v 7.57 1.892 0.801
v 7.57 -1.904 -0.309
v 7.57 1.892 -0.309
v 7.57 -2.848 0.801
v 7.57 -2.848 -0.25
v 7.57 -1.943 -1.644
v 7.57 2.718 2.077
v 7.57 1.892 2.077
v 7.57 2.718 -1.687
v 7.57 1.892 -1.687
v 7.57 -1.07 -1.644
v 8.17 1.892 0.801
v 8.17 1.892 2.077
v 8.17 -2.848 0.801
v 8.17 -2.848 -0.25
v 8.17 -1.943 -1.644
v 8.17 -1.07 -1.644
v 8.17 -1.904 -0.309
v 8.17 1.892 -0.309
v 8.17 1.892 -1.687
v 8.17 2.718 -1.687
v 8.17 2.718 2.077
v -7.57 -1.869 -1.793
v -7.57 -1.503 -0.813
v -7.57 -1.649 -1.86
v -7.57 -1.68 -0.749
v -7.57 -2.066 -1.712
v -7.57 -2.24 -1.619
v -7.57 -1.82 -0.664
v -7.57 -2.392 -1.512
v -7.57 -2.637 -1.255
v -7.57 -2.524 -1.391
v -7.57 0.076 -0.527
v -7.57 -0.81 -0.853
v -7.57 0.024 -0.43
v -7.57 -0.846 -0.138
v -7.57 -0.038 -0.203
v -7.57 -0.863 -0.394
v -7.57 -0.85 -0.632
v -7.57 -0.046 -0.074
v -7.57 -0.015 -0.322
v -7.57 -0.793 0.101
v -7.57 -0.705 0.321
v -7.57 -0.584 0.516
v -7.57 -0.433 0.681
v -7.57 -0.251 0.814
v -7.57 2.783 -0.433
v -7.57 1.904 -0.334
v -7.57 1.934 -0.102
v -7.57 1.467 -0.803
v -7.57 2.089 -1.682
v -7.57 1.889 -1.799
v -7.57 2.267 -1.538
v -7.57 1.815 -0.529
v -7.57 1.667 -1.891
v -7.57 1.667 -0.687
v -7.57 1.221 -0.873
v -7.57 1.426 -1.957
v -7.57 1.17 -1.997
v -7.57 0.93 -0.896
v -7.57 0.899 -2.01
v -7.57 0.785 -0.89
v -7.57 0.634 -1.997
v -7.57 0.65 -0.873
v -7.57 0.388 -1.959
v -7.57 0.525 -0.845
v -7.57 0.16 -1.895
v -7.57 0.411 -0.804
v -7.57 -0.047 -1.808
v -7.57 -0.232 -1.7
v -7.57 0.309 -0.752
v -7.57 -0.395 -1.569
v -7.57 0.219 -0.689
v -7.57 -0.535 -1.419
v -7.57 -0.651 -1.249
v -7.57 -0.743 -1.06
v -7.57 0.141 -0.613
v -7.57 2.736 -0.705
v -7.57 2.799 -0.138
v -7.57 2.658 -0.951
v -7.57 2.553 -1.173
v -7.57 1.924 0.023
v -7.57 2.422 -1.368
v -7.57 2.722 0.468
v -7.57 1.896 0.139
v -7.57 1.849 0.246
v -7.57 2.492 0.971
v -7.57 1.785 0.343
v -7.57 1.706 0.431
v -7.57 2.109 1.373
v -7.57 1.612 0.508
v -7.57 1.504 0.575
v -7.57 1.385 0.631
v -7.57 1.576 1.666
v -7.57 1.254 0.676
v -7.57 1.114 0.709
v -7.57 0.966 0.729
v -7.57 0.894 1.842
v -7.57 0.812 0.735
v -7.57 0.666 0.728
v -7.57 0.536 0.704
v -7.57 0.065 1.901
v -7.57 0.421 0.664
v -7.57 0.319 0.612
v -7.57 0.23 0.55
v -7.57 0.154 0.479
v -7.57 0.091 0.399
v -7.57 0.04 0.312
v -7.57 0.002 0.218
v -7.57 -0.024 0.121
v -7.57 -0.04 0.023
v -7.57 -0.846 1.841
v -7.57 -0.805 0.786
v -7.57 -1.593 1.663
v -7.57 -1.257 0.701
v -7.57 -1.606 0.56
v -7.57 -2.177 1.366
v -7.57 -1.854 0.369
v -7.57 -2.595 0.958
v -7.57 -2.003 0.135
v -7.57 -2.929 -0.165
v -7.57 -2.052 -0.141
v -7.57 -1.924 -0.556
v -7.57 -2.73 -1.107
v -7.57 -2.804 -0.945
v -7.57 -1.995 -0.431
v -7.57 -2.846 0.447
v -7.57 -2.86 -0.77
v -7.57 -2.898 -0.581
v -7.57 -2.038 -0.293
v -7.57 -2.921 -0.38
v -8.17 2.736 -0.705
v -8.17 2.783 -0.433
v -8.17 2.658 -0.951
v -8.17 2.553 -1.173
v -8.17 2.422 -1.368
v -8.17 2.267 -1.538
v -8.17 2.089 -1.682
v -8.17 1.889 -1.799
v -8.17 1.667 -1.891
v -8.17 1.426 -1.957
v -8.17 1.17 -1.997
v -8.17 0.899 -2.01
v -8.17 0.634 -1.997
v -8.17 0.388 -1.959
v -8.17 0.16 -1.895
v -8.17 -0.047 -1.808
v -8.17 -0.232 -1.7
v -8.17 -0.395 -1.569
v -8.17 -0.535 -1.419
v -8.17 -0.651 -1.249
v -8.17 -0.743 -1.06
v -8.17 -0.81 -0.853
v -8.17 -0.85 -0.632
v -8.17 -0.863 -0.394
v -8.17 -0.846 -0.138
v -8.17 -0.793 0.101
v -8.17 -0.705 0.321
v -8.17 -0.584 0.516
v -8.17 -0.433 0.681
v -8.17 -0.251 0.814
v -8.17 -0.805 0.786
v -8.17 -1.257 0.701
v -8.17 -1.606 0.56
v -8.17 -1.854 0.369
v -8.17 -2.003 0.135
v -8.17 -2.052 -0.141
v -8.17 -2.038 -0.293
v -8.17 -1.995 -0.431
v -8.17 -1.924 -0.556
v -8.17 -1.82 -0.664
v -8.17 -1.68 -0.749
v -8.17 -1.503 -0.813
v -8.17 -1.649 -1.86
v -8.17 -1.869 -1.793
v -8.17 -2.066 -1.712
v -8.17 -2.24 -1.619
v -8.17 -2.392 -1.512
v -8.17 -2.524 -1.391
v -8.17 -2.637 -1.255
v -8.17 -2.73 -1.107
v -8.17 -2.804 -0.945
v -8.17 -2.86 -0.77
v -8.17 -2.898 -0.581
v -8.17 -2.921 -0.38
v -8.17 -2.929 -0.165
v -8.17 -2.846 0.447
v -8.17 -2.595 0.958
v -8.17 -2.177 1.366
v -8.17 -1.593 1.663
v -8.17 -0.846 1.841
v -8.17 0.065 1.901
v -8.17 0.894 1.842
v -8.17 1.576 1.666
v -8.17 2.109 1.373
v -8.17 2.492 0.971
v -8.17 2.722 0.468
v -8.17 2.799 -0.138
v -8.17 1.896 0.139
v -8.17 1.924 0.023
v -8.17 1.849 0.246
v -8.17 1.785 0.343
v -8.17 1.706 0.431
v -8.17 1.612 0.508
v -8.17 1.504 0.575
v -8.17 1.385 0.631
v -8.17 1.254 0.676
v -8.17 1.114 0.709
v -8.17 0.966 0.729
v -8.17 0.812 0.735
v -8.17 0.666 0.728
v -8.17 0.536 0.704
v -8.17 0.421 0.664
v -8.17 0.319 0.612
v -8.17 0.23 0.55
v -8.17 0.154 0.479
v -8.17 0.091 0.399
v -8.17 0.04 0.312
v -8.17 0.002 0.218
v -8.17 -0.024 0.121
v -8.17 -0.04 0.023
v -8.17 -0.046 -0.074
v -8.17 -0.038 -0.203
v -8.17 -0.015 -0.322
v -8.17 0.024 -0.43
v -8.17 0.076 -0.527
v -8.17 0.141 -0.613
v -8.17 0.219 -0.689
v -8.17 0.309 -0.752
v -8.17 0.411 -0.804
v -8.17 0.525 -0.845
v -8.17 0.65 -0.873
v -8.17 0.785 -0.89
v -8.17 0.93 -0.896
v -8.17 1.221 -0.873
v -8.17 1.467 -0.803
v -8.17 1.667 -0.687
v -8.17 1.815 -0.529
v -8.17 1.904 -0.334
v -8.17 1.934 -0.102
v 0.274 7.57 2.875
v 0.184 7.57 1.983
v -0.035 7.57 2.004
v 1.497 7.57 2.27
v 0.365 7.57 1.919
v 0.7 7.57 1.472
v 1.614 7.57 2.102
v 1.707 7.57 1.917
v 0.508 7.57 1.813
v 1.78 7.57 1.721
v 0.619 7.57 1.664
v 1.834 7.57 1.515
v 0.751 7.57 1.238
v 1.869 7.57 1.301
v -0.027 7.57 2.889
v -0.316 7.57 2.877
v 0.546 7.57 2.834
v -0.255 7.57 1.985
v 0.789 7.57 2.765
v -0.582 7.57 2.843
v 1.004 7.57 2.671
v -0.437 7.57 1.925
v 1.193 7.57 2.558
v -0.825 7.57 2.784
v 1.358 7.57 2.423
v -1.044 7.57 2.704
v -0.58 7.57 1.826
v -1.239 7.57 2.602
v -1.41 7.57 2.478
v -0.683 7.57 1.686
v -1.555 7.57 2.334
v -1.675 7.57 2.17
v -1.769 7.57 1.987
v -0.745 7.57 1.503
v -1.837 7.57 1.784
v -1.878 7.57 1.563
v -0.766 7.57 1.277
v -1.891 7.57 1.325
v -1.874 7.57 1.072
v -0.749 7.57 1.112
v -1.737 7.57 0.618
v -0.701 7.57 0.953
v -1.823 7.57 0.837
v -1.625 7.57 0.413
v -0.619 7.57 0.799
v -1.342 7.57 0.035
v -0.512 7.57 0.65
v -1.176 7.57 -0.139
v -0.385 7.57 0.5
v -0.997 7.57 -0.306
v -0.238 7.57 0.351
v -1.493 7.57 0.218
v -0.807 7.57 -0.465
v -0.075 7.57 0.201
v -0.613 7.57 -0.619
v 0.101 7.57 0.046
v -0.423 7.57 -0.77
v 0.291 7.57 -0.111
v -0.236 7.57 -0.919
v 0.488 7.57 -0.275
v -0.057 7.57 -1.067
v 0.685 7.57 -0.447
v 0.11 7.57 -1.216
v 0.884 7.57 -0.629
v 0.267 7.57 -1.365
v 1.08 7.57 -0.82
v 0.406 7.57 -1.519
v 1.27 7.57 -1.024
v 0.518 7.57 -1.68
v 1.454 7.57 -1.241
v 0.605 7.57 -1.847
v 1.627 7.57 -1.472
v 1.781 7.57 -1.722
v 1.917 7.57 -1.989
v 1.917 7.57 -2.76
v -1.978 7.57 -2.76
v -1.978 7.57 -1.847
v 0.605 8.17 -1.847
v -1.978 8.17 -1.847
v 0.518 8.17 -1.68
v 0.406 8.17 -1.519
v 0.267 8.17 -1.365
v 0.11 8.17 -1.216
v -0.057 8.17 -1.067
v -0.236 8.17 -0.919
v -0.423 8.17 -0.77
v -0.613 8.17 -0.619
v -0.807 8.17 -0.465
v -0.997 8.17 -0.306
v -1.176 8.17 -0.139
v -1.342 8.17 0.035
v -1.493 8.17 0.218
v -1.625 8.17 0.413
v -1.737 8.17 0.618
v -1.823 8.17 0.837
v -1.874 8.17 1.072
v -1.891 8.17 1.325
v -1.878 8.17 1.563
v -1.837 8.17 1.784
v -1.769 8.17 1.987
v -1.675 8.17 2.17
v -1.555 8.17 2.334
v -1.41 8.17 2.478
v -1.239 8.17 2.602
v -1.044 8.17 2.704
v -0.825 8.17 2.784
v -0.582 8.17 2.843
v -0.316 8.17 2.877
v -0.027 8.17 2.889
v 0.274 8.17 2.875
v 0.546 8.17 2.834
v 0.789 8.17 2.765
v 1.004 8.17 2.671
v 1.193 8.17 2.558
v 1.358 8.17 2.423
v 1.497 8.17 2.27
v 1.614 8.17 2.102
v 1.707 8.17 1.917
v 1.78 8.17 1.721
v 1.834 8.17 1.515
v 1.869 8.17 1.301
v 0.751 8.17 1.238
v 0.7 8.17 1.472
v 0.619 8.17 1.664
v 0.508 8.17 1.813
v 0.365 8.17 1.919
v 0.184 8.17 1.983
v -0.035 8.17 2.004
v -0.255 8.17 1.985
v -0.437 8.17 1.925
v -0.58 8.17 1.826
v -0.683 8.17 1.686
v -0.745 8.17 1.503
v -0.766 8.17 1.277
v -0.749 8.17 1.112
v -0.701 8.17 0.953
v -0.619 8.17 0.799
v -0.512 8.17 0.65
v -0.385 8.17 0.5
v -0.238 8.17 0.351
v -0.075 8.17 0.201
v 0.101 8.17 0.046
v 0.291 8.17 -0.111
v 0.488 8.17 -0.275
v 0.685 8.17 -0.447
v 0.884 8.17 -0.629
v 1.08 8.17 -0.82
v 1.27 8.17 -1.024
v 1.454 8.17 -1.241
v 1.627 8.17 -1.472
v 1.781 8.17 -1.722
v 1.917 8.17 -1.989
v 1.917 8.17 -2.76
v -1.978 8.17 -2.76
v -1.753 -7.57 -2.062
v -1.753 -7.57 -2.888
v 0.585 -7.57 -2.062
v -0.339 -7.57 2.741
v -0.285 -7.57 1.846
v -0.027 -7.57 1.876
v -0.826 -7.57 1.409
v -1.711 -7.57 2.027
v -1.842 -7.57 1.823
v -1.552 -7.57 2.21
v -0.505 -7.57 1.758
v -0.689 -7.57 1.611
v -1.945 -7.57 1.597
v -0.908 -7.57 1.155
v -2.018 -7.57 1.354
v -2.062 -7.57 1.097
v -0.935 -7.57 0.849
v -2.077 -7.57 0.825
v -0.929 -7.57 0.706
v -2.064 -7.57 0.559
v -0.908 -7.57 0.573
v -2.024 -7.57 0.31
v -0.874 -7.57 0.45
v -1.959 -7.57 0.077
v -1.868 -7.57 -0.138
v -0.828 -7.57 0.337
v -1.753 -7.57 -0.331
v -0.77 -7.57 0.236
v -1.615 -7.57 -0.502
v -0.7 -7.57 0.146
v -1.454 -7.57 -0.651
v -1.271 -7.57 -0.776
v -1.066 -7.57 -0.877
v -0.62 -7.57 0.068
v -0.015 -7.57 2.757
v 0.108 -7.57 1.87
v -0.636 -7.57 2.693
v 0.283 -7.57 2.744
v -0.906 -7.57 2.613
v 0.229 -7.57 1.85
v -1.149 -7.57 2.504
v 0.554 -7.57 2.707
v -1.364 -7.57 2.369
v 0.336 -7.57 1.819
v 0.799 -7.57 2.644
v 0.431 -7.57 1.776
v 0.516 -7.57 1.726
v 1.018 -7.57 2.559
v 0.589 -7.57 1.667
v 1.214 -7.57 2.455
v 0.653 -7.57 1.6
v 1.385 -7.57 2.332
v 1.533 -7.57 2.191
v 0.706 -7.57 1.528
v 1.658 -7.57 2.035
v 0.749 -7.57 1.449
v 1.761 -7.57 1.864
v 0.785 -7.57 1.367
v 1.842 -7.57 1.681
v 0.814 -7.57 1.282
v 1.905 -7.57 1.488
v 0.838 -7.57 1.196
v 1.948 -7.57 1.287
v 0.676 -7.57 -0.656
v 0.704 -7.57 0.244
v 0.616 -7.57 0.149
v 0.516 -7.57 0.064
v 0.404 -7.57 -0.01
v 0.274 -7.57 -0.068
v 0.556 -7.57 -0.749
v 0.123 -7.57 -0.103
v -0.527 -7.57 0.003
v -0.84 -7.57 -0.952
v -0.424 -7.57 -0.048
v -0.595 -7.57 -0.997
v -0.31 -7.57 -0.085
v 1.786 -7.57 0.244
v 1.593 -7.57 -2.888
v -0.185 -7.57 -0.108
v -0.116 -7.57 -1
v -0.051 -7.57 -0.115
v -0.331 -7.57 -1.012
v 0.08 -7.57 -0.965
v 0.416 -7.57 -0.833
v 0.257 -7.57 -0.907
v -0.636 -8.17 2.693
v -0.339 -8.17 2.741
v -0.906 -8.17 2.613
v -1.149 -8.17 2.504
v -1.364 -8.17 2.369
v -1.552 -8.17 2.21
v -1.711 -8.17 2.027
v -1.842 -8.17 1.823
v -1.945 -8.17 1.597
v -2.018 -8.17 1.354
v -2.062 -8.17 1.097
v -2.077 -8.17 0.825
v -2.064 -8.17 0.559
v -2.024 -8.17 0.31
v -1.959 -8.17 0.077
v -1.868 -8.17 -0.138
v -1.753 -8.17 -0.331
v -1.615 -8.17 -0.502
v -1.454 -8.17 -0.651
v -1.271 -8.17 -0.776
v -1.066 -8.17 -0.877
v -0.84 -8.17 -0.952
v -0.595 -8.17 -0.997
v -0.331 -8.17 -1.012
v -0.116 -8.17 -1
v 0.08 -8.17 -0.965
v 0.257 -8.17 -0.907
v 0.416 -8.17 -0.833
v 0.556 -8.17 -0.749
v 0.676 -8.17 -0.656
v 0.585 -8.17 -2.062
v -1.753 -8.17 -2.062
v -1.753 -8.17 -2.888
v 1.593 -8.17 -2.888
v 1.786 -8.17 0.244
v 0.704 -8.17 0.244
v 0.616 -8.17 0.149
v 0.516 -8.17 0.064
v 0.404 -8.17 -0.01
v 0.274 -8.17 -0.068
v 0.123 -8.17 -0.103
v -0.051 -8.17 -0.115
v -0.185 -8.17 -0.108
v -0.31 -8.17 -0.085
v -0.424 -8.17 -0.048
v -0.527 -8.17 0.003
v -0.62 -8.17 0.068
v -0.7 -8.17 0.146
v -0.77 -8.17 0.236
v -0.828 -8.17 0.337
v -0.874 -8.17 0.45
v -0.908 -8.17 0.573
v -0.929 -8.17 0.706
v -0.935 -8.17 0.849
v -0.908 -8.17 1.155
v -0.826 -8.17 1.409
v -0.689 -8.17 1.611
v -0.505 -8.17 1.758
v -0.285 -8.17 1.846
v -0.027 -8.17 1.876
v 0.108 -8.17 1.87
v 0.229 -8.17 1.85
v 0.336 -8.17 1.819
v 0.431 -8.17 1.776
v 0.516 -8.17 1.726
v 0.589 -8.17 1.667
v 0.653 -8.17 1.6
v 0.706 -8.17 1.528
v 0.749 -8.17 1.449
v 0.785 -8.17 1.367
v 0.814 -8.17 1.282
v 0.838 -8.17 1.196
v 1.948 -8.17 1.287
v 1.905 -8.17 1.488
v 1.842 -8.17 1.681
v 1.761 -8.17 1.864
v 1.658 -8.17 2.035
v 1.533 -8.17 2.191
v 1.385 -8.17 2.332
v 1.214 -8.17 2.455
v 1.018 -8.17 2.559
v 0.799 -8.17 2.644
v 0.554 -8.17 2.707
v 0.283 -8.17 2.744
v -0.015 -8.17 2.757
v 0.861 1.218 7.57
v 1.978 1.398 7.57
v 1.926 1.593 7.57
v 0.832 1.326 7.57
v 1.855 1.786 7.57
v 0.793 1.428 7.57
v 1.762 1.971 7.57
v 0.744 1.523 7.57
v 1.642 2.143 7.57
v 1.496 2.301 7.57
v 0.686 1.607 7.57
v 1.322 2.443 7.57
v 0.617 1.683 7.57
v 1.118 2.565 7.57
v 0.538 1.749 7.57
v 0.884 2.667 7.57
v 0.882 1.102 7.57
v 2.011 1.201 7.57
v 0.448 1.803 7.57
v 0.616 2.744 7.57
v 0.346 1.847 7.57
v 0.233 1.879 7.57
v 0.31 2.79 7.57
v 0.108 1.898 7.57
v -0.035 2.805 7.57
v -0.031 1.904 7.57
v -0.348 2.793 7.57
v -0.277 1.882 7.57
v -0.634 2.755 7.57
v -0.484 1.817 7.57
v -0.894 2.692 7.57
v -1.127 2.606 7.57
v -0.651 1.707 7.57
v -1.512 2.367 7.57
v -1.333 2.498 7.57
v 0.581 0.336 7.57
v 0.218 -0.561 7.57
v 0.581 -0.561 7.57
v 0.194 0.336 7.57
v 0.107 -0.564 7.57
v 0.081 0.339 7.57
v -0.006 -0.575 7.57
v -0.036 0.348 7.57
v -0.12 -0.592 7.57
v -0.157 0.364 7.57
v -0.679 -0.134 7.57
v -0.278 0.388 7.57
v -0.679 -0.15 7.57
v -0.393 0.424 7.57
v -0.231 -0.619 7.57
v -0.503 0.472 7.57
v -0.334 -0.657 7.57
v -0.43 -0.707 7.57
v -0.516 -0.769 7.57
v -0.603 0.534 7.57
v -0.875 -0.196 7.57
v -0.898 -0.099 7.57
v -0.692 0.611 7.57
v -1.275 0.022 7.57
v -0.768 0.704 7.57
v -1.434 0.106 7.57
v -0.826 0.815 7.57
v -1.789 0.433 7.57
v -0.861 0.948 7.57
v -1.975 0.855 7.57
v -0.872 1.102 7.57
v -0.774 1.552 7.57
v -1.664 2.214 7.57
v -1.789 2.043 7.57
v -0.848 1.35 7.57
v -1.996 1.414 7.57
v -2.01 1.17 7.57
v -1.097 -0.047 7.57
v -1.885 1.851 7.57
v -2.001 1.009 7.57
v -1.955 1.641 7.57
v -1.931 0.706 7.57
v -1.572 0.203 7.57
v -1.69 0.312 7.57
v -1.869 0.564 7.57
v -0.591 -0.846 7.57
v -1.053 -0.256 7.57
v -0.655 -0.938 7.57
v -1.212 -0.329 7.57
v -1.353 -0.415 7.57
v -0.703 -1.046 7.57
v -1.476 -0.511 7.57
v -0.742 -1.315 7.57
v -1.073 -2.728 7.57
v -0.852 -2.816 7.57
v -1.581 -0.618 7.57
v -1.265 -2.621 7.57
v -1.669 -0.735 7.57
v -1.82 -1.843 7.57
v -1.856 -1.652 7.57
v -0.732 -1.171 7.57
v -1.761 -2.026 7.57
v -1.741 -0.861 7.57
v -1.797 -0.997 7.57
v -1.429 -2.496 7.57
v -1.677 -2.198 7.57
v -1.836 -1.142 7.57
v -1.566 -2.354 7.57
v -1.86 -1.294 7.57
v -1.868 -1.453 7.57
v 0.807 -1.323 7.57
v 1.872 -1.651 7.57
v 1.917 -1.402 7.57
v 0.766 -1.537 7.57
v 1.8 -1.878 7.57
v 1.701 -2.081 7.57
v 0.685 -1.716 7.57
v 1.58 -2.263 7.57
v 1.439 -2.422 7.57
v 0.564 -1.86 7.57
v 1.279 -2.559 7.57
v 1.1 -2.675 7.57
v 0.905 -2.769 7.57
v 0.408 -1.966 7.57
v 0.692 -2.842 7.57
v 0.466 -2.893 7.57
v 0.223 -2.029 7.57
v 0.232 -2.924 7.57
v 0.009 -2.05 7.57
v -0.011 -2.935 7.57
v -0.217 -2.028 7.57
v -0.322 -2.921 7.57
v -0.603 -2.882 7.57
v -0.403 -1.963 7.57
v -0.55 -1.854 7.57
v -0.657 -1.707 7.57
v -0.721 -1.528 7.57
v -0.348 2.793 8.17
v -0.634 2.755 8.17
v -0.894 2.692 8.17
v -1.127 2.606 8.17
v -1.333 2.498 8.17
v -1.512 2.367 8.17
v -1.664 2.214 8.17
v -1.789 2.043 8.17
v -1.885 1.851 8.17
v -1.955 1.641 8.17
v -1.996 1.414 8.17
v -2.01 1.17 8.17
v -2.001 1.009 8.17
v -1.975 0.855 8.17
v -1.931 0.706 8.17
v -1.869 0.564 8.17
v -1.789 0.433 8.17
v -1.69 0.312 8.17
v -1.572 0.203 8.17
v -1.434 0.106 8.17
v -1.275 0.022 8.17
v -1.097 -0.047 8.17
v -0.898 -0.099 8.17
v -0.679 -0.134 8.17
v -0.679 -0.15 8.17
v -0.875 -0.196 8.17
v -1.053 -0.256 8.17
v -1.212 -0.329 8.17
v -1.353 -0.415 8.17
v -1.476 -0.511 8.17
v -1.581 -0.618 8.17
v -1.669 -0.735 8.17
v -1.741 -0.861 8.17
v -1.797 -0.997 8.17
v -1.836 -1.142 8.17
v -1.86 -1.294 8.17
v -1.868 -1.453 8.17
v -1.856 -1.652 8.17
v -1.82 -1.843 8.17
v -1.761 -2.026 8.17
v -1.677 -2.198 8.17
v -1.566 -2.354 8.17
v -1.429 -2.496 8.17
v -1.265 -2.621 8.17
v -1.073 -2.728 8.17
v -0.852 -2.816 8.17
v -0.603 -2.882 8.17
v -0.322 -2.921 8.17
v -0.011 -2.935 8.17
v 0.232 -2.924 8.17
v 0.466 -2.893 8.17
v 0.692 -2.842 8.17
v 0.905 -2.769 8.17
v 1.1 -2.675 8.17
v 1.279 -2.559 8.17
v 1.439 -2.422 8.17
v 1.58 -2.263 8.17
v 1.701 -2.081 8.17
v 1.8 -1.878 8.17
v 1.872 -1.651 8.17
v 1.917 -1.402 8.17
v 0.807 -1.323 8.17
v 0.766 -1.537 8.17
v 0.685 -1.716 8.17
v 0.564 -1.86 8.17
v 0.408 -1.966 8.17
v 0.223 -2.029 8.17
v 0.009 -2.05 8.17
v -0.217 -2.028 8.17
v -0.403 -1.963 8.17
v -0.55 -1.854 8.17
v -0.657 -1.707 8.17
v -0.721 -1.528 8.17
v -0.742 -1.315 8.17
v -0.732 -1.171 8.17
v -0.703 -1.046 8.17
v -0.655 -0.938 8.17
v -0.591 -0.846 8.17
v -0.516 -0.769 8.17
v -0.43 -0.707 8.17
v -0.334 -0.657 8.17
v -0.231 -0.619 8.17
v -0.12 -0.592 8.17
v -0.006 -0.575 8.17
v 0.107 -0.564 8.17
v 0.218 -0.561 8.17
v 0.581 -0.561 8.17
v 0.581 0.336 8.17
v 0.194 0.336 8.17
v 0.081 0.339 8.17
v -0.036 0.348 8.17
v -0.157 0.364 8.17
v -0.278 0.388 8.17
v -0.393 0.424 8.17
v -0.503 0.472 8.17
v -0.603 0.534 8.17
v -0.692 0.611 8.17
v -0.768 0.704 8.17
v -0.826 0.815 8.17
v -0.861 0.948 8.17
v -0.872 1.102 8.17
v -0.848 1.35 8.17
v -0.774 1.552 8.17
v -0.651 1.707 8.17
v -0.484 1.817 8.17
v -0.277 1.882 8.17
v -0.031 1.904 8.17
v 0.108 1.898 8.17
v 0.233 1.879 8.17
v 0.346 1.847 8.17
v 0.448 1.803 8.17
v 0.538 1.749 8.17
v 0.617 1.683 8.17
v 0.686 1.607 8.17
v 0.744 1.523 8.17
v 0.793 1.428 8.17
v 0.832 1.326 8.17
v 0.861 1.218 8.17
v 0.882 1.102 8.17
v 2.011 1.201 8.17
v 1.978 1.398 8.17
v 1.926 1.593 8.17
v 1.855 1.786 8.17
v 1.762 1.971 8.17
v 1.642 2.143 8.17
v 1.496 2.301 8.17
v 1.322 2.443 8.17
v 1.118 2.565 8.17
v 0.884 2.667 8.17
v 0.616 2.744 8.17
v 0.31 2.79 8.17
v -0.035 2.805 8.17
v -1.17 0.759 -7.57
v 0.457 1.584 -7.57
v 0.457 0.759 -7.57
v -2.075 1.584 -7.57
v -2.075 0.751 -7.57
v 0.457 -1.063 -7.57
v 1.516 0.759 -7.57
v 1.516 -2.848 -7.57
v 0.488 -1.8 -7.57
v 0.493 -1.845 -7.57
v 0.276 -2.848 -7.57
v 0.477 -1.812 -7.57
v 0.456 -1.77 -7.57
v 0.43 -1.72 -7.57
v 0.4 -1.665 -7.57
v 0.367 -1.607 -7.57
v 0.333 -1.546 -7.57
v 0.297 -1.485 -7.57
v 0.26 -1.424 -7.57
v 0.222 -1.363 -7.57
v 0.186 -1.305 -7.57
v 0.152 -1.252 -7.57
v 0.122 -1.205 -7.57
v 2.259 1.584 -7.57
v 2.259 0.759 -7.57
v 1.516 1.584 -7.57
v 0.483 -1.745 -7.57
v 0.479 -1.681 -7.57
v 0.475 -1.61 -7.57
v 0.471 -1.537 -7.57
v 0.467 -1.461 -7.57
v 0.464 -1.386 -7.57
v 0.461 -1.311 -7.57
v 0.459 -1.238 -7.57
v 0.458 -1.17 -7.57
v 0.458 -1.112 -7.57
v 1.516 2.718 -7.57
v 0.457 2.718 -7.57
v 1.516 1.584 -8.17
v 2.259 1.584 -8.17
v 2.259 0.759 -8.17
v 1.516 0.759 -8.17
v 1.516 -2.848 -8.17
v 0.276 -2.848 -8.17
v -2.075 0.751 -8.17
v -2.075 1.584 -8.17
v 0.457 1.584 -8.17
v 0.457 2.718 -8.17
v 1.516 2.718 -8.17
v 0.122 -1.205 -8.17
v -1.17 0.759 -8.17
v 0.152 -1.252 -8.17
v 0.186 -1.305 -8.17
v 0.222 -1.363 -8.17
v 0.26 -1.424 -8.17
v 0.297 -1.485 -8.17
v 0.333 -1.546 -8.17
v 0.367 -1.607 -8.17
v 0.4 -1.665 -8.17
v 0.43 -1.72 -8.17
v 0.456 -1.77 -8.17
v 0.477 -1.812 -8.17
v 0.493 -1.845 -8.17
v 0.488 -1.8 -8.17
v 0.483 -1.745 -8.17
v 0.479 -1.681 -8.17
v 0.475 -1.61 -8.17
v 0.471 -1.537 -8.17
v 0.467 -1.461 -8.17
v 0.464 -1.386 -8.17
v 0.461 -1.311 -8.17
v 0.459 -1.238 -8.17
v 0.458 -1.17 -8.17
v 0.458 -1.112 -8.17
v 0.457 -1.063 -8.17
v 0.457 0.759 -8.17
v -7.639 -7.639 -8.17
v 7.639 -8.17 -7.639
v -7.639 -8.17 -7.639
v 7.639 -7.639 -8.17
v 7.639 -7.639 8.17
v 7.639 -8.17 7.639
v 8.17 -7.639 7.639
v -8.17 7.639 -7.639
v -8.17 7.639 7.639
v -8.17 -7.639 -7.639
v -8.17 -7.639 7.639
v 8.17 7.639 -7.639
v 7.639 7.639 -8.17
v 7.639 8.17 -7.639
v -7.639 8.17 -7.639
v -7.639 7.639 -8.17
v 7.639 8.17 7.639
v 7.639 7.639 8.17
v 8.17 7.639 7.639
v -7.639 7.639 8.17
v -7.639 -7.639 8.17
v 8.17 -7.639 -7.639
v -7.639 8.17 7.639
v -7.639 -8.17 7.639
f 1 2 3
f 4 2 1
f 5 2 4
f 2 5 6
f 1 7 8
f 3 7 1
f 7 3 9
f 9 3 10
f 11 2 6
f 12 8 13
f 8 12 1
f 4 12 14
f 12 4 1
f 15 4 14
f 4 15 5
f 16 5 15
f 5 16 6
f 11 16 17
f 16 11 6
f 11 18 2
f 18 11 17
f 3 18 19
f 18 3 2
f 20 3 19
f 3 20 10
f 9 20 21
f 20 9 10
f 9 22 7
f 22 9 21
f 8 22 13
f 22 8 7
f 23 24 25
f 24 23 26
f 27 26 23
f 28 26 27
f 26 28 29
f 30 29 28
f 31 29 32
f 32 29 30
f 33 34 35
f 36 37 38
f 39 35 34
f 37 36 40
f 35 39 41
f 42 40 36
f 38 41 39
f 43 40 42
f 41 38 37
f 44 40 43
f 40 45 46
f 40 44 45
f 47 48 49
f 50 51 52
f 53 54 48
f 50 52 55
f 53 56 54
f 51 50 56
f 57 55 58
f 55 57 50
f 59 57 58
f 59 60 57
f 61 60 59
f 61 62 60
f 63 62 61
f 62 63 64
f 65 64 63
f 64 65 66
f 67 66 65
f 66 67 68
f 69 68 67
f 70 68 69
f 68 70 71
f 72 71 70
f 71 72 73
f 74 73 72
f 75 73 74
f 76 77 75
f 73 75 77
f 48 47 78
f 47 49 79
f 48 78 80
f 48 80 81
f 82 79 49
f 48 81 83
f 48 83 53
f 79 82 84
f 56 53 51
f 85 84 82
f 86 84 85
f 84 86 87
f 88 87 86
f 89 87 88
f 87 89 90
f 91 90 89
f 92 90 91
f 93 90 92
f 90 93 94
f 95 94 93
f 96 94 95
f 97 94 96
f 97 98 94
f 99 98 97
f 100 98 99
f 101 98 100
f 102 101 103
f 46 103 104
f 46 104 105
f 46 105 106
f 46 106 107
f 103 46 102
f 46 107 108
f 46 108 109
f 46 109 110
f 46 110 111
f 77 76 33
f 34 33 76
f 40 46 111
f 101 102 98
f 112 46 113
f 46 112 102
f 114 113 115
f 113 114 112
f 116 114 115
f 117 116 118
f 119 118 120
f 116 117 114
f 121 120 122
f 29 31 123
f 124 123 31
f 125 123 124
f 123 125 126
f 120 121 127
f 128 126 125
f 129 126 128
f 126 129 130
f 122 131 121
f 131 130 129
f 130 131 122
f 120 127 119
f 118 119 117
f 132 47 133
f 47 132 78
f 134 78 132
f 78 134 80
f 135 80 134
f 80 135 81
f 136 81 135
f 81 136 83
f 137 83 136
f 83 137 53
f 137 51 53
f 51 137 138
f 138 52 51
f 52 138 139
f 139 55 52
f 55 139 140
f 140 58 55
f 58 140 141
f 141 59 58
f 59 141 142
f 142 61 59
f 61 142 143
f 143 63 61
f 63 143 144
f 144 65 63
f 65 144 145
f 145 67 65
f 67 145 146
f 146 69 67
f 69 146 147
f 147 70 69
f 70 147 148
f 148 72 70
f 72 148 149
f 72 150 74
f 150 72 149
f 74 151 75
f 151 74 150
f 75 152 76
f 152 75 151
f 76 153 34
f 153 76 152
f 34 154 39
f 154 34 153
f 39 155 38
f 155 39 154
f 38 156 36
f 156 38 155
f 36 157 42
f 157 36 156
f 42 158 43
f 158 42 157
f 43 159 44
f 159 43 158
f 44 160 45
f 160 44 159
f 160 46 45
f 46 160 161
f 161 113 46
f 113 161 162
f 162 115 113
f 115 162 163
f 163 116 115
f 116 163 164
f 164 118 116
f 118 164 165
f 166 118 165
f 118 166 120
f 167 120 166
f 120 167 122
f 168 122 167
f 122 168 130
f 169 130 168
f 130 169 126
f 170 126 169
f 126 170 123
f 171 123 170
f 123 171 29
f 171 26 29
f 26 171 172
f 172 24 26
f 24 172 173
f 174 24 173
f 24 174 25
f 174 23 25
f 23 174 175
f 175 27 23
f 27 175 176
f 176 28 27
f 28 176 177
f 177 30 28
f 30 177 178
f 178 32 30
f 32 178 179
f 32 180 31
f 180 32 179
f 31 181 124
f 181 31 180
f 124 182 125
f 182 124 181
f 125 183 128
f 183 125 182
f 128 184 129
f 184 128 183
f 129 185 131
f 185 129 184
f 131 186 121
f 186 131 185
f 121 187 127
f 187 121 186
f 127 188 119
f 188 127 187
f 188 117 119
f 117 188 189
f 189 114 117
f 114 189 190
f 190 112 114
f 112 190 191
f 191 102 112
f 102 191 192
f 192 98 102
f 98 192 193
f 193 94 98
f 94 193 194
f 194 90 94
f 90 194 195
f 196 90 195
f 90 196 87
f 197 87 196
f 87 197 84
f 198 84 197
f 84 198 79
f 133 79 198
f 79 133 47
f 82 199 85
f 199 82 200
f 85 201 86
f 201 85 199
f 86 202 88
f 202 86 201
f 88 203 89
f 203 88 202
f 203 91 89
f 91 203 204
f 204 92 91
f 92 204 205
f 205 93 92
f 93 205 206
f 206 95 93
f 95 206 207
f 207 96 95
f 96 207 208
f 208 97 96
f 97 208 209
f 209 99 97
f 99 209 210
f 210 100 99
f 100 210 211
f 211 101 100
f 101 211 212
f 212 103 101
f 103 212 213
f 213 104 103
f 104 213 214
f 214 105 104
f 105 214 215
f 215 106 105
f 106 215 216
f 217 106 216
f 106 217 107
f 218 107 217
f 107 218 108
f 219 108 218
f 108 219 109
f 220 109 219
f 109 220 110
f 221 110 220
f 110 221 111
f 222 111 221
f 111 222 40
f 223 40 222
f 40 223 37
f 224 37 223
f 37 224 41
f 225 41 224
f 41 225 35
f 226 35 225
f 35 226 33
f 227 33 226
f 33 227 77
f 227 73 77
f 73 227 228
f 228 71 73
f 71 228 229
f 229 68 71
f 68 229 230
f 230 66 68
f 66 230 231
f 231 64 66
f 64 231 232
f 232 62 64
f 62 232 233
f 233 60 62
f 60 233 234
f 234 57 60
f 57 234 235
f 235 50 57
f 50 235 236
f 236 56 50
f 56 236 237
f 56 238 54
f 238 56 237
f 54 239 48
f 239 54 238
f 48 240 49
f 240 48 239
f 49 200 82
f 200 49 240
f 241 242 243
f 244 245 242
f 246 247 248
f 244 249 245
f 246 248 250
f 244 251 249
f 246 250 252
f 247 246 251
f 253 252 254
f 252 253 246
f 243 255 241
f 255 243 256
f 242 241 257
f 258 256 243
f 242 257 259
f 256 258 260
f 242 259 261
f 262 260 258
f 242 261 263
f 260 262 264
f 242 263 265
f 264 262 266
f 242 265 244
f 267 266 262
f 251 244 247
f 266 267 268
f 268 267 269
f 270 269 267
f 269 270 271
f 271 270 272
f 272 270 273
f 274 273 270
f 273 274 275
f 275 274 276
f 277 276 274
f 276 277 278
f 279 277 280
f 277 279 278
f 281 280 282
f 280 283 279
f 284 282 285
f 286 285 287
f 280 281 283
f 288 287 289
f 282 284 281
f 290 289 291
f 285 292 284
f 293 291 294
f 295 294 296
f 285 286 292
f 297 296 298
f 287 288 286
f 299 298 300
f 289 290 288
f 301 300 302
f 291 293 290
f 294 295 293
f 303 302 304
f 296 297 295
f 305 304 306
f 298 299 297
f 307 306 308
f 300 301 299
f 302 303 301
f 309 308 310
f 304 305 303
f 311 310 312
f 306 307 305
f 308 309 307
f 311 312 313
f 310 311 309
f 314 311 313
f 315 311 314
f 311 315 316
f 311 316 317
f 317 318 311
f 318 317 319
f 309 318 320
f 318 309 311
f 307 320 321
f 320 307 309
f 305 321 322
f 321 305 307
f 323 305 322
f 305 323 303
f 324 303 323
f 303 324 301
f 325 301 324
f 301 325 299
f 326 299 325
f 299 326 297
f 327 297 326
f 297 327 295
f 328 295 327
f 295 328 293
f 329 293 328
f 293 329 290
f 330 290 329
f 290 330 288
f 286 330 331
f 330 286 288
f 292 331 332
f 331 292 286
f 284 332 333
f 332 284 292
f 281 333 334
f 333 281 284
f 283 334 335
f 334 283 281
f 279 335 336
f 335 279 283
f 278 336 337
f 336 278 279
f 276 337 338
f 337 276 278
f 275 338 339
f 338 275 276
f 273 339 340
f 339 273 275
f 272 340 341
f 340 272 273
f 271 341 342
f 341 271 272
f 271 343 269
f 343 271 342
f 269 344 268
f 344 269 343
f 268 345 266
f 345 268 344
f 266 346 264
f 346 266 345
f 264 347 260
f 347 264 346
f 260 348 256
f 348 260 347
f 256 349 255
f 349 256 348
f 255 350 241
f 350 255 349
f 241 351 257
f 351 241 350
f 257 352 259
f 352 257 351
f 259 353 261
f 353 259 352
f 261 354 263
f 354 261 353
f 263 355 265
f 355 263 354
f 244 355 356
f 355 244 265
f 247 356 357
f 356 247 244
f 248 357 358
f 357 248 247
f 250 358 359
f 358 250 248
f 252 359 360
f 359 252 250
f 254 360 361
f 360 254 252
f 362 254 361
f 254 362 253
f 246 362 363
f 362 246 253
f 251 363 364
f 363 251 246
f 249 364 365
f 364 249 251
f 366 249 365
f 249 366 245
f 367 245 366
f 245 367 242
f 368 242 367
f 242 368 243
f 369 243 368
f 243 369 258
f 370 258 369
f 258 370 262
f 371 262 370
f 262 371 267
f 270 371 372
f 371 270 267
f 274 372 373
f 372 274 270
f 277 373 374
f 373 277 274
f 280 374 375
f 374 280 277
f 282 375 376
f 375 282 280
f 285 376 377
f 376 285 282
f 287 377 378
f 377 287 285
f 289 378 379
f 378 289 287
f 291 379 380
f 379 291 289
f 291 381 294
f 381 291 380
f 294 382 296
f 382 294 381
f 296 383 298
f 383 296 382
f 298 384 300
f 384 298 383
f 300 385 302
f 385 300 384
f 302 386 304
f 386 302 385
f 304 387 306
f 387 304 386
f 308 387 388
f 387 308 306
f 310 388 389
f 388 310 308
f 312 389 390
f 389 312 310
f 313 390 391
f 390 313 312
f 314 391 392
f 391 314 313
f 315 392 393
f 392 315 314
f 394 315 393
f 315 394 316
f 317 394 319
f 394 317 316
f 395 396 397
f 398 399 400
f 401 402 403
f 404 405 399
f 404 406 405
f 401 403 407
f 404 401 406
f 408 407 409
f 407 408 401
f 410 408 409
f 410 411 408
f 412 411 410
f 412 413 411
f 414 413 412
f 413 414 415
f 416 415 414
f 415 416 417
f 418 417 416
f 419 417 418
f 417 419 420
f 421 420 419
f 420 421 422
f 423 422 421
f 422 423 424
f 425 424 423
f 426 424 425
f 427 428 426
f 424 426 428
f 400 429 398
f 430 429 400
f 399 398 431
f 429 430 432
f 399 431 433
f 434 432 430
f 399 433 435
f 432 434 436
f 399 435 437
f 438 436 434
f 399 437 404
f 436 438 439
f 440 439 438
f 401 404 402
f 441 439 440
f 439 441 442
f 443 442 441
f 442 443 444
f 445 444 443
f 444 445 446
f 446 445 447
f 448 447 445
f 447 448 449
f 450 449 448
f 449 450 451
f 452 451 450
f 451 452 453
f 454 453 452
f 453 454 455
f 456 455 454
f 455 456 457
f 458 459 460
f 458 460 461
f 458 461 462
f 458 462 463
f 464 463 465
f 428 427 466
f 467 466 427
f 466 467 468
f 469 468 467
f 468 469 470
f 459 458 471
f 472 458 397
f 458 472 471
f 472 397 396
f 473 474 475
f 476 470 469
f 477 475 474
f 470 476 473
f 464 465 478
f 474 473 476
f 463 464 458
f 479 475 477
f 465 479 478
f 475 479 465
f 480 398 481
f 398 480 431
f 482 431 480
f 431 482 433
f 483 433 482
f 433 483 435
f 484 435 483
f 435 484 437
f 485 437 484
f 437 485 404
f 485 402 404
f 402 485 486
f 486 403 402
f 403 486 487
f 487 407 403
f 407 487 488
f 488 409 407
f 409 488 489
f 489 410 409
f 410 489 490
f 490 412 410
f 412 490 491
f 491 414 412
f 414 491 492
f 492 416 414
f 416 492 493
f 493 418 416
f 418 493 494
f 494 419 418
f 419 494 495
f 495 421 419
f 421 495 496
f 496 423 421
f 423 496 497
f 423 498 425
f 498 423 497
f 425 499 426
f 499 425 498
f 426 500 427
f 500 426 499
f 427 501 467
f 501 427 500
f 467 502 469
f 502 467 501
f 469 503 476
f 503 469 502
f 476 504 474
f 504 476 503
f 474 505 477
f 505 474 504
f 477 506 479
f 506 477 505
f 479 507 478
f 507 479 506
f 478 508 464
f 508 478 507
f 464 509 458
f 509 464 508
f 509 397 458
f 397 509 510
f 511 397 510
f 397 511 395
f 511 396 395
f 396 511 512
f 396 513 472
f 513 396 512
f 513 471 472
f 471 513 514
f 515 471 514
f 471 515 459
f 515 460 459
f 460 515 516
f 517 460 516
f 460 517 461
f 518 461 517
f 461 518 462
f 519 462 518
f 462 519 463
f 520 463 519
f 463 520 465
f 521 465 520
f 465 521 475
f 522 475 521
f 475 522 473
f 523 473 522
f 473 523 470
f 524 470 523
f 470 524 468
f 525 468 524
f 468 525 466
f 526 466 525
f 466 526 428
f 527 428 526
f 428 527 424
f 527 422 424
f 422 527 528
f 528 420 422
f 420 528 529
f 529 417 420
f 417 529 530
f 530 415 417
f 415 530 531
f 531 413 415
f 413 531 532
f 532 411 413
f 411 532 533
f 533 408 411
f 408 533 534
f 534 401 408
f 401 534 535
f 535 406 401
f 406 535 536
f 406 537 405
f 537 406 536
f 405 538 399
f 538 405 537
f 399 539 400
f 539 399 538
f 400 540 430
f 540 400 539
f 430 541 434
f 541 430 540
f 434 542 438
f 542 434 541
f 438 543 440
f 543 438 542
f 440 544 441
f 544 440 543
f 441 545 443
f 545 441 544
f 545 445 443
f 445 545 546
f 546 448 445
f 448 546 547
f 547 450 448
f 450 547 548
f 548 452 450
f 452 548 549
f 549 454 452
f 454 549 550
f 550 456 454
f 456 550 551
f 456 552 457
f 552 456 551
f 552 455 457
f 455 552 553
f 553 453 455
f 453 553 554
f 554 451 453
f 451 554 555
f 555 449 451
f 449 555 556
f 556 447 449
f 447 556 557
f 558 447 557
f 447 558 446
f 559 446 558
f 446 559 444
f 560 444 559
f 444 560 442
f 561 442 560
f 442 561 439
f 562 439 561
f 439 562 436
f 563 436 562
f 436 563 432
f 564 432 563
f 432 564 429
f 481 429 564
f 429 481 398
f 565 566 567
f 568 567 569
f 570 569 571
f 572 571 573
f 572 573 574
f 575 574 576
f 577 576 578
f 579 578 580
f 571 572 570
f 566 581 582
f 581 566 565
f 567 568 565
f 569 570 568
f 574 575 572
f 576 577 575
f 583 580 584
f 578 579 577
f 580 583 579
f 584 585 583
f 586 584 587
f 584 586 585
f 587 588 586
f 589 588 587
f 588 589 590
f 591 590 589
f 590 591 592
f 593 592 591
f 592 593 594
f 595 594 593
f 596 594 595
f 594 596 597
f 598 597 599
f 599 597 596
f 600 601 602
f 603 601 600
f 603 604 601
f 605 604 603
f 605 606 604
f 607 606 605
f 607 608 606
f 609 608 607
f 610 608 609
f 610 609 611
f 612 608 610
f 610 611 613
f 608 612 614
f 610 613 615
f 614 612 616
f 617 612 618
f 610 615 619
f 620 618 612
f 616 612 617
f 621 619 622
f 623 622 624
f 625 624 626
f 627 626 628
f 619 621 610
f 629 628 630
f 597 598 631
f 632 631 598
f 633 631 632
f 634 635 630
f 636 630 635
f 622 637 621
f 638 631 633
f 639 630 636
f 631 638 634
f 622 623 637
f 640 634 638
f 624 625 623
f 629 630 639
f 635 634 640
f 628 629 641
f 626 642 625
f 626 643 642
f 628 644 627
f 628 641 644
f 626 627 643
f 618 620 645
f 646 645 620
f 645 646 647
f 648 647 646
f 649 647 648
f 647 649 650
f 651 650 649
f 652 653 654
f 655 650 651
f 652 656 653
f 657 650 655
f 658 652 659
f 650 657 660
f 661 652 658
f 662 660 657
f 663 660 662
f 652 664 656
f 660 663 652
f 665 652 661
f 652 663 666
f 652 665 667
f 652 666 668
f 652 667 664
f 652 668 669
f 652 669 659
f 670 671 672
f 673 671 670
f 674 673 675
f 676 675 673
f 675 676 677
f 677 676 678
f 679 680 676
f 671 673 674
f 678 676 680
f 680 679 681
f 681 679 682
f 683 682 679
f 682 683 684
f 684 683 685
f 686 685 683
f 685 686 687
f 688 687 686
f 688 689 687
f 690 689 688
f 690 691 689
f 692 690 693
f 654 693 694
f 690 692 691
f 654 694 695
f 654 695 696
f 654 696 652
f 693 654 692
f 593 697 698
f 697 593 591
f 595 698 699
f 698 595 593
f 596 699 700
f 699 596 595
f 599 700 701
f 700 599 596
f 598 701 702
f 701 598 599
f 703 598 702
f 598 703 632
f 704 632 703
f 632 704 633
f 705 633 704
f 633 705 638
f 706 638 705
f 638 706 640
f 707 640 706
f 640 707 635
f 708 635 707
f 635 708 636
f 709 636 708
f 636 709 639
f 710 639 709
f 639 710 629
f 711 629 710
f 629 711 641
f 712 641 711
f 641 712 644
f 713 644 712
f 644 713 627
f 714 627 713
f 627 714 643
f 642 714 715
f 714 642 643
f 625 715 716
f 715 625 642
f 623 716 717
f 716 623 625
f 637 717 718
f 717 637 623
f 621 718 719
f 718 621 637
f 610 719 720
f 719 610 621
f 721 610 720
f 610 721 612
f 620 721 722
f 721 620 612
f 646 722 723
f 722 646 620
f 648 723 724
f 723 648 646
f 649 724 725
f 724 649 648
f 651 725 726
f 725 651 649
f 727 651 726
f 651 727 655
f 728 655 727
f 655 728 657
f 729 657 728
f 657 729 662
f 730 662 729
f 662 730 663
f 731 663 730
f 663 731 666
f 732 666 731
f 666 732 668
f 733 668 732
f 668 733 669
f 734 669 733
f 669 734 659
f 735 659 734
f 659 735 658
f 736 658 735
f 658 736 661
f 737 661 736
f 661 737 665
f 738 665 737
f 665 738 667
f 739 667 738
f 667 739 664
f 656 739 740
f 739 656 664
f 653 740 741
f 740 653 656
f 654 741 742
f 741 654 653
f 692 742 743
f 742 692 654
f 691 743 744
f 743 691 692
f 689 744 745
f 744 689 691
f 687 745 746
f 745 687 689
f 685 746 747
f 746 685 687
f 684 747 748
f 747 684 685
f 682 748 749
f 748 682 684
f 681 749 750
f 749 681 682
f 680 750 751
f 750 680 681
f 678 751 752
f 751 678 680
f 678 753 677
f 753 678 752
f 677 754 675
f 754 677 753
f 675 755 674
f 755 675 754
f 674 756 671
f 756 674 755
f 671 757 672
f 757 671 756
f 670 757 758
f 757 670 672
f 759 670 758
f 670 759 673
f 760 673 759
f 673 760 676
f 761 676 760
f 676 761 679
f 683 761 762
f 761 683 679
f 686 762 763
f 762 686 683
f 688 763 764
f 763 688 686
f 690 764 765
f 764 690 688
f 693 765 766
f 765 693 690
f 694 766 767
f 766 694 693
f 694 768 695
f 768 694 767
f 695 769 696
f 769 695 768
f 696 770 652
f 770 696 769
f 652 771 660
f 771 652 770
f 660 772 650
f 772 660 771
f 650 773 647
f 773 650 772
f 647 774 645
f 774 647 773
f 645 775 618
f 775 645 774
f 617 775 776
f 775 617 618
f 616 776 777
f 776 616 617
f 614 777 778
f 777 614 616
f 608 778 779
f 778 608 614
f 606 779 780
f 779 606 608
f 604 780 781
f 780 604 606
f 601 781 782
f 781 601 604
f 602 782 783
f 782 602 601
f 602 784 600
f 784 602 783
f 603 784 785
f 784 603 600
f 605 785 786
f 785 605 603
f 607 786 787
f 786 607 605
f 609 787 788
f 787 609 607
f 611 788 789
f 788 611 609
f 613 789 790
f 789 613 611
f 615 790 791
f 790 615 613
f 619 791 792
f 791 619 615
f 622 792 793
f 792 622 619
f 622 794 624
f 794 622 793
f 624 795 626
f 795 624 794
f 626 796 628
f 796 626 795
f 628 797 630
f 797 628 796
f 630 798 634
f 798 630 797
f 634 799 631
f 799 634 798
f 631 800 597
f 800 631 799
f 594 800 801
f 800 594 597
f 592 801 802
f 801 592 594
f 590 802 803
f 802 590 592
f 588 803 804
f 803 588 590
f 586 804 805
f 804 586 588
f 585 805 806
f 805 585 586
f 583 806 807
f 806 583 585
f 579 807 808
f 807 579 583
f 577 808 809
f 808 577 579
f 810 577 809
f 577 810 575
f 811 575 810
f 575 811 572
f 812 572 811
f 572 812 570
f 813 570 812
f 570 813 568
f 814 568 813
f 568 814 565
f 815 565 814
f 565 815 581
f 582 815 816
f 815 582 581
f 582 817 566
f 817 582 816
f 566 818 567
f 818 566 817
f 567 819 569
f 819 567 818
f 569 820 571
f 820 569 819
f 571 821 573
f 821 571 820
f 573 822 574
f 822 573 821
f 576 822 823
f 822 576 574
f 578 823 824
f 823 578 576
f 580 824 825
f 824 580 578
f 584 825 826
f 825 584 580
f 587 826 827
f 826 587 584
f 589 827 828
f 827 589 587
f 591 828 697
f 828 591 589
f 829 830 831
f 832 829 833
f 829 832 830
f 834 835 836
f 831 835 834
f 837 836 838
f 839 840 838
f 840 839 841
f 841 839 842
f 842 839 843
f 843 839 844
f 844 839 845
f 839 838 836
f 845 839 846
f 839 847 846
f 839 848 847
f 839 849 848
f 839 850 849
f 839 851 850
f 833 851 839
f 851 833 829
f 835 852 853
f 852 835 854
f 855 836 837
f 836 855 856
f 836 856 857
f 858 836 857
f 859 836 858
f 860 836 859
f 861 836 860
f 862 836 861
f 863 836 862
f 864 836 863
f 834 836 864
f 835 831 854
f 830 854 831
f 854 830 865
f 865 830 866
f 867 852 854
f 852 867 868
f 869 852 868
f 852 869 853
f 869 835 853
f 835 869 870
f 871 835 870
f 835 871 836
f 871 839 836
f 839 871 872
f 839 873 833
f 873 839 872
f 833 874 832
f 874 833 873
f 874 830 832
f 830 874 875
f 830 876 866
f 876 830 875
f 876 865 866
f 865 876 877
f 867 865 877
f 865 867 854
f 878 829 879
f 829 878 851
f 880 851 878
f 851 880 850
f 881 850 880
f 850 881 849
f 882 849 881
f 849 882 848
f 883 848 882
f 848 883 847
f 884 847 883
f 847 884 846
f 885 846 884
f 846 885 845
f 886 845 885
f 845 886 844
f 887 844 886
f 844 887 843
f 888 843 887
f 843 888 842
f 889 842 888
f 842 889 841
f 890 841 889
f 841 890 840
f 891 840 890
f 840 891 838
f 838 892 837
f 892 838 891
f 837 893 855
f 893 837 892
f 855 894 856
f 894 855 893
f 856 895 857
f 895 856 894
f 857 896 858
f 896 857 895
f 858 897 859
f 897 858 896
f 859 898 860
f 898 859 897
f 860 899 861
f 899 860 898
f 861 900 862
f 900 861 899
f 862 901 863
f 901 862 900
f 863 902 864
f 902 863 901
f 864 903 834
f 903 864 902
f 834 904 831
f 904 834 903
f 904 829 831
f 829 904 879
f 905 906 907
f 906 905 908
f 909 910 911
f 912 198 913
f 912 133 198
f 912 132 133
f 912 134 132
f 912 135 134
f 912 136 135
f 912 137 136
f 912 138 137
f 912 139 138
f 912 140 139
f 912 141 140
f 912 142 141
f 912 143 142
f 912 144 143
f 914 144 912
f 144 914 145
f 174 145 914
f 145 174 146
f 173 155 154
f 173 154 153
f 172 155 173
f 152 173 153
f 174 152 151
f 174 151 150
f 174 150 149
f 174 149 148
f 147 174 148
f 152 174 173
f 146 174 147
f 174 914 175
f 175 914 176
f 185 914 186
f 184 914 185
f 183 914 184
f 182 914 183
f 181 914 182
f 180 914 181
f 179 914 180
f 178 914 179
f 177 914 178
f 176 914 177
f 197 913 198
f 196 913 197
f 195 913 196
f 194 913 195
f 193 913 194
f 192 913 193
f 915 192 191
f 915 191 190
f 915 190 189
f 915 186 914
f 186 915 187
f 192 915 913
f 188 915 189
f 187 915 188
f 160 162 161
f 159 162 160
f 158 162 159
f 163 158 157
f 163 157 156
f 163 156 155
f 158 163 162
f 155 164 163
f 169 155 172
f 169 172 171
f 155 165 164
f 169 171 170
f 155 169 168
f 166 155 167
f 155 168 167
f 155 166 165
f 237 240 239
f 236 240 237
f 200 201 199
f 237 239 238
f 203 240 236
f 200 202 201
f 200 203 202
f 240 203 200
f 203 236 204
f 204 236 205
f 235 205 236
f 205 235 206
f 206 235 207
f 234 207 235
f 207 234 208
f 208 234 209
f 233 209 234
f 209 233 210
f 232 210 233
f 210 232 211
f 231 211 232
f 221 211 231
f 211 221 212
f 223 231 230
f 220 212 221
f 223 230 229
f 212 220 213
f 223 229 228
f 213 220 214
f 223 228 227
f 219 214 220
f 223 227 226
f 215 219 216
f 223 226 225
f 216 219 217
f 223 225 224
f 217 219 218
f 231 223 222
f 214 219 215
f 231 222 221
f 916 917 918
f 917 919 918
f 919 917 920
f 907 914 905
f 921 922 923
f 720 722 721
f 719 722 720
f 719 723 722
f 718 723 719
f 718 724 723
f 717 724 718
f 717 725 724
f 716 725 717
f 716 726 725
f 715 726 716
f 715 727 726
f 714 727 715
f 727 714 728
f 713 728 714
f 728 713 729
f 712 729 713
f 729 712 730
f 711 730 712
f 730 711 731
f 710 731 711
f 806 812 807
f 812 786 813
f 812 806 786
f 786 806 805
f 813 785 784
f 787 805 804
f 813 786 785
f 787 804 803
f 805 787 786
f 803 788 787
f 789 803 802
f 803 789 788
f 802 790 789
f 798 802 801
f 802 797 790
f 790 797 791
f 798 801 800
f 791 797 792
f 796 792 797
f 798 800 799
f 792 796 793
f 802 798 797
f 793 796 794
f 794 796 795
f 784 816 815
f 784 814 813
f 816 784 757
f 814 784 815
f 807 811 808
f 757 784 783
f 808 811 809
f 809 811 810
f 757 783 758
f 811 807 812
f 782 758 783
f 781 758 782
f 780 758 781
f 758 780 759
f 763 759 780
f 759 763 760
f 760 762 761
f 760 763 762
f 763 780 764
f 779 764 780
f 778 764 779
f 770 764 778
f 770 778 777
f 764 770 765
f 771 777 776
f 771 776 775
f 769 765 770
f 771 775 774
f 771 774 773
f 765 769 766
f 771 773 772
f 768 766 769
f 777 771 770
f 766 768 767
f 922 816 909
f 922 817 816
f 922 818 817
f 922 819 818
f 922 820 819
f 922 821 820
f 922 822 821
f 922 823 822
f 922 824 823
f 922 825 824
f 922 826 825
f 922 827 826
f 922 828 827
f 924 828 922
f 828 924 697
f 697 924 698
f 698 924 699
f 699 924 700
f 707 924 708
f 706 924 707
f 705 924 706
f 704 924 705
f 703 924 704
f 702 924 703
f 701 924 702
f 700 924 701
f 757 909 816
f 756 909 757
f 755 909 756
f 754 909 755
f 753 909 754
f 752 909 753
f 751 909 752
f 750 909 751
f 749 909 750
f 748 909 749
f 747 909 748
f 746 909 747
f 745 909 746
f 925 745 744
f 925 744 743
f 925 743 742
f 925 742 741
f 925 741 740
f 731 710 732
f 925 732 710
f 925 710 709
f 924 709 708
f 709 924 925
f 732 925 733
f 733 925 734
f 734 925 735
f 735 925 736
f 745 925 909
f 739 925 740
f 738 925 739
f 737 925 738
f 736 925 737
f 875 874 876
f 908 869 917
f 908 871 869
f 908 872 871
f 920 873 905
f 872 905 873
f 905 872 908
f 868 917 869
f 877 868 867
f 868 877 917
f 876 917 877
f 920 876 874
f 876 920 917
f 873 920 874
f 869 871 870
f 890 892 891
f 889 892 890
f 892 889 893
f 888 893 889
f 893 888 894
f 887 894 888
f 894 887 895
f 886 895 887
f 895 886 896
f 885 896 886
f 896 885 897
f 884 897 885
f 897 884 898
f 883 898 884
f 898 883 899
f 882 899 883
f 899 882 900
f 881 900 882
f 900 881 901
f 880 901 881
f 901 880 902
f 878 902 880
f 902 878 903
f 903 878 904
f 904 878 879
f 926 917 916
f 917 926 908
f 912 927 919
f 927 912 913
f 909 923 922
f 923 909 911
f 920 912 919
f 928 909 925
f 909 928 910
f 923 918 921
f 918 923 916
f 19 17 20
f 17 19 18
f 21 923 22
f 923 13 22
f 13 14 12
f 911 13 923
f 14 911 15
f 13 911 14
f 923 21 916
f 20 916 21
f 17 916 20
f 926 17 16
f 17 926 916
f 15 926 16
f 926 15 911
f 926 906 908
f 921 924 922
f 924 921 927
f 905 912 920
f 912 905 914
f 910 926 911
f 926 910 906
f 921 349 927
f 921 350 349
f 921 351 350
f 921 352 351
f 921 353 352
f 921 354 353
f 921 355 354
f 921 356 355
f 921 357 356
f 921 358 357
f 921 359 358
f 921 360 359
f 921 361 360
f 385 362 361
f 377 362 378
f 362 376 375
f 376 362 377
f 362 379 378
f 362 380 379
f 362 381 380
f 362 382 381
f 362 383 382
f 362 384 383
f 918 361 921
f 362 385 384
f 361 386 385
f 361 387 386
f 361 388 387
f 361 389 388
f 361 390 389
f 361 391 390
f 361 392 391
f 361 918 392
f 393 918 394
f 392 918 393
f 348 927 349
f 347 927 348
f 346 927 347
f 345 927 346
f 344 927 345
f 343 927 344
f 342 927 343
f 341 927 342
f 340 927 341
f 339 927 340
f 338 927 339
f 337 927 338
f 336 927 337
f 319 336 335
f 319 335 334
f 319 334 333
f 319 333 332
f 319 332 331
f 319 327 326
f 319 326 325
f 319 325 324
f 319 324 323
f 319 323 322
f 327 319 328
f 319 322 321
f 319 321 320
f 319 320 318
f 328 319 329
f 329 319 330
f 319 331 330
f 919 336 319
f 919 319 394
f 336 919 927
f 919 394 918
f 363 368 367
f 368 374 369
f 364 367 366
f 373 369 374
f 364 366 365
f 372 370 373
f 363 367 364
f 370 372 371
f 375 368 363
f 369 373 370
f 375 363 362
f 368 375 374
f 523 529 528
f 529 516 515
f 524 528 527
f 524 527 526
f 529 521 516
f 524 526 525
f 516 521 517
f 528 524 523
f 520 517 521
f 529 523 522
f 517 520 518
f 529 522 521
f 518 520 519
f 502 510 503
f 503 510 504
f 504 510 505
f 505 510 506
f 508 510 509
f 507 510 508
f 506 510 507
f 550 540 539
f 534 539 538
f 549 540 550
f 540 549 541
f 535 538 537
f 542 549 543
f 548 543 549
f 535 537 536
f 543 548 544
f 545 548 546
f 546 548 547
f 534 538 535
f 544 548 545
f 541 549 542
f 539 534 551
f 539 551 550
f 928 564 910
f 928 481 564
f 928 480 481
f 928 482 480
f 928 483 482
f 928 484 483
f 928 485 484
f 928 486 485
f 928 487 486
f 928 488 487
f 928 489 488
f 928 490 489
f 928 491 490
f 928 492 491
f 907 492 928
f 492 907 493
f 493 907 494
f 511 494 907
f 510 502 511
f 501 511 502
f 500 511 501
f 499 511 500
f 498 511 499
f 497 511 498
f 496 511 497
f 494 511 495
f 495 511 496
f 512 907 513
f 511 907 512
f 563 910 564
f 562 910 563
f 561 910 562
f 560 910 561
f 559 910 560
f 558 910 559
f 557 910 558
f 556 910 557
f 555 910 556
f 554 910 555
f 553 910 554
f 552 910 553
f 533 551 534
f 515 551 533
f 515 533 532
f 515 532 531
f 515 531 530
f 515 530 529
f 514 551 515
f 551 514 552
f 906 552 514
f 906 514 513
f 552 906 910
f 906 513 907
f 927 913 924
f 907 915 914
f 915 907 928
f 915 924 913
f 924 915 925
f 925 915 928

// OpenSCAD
// Open Dice d6, generated by scripts/export-models.mjs from the same
// geometry the web roller draws. By Zein Alaouie, CC BY 4.0: credit
// "Dice model by Zein Alaouie (Open Dice), CC BY 4.0" when you share this
// model, a remix or prints. https://github.com/Greycell-open/OpenDice
// Edit the parameters, then
// Render (F6) and Export as STL. Regenerate with: npm run models
//
// Opposite faces sum to 7.

size_scale     = 1.0;    // 1.0 = standard size (d20 about 20 mm, d6 about 16 mm); 1.25 is 25 percent larger
engrave_depth  = 0.6;    // mm into each face
font           = "Liberation Sans:style=Bold";
text_scale     = 1.0;    // grow or shrink every number
mark_six_nine  = false;  // a dot after 6 and 9 so they can be told apart

points = [[7.639,-8.17,-7.639],[-7.639,-7.639,-8.17],[7.639,-7.639,-8.17],[8.17,-7.639,7.639],[7.639,-8.17,7.639],[-7.639,-8.17,7.639],[7.639,7.639,-8.17],[8.17,7.639,-7.639],[-8.17,7.639,-7.639],[-8.17,7.639,7.639],[-7.639,8.17,-7.639],[-7.639,8.17,7.639],[7.639,-7.639,8.17],[7.639,7.639,8.17],[8.17,7.639,7.639],[8.17,-7.639,-7.639],[7.639,8.17,-7.639],[-7.639,7.639,-8.17],[-8.17,-7.639,-7.639],[-7.639,7.639,8.17],[7.639,8.17,7.639],[-7.639,-8.17,-7.639],[-8.17,-7.639,7.639],[-7.639,-7.639,8.17]];
// Counter-clockwise from outside in the source; OpenSCAD wants clockwise.
faces = [[0,2,1],[0,4,3],[0,5,4],[6,1,2],[6,2,7],[8,10,9],[11,9,10],[12,4,5],[12,3,4],[12,13,3],[14,3,13],[14,7,3],[15,0,3],[15,2,0],[15,7,2],[15,3,7],[16,6,7],[16,10,6],[16,11,10],[16,7,14],[17,6,10],[17,1,6],[17,8,1],[17,10,8],[18,8,9],[18,1,8],[19,13,12],[19,11,13],[19,9,11],[20,16,14],[20,11,16],[20,13,11],[20,14,13],[21,18,5],[21,1,18],[21,0,1],[21,5,0],[22,18,9],[22,5,18],[22,9,19],[23,22,19],[23,5,22],[23,12,5],[23,19,12]];

// [number, text height in mm, placement on the face]
labels = [
  [1, 9.3955, [[0,0,1,8.17],[0,-1,0,0],[1,0,0,0],[0,0,0,1]]],
  [6, 9.3955, [[0,0,-1,-8.17],[0,-1,0,0],[-1,0,0,0],[0,0,0,1]]],
  [2, 9.3955, [[-1,0,0,0],[0,0,1,8.17],[0,1,0,0],[0,0,0,1]]],
  [5, 9.3955, [[-1,0,0,0],[0,0,-1,-8.17],[0,-1,0,0],[0,0,0,1]]],
  [3, 9.3955, [[-1,0,0,0],[0,-1,0,0],[0,0,1,8.17],[0,0,0,1]]],
  [4, 9.3955, [[1,0,0,0],[0,-1,0,0],[0,0,-1,-8.17],[0,0,0,1]]]
];

function label_text(n) = (mark_six_nine && (n == 6 || n == 9)) ? str(n, ".") : str(n);

scale(size_scale) difference() {
  polyhedron(points = points, faces = faces, convexity = 2);
  for (l = labels)
    multmatrix(l[2])
      translate([0, 0, -engrave_depth / size_scale])
        linear_extrude(engrave_depth / size_scale + 0.05)
          text(label_text(l[0]), size = l[1] * 0.62 * text_scale, font = font,
               halign = "center", valign = "center");
}
